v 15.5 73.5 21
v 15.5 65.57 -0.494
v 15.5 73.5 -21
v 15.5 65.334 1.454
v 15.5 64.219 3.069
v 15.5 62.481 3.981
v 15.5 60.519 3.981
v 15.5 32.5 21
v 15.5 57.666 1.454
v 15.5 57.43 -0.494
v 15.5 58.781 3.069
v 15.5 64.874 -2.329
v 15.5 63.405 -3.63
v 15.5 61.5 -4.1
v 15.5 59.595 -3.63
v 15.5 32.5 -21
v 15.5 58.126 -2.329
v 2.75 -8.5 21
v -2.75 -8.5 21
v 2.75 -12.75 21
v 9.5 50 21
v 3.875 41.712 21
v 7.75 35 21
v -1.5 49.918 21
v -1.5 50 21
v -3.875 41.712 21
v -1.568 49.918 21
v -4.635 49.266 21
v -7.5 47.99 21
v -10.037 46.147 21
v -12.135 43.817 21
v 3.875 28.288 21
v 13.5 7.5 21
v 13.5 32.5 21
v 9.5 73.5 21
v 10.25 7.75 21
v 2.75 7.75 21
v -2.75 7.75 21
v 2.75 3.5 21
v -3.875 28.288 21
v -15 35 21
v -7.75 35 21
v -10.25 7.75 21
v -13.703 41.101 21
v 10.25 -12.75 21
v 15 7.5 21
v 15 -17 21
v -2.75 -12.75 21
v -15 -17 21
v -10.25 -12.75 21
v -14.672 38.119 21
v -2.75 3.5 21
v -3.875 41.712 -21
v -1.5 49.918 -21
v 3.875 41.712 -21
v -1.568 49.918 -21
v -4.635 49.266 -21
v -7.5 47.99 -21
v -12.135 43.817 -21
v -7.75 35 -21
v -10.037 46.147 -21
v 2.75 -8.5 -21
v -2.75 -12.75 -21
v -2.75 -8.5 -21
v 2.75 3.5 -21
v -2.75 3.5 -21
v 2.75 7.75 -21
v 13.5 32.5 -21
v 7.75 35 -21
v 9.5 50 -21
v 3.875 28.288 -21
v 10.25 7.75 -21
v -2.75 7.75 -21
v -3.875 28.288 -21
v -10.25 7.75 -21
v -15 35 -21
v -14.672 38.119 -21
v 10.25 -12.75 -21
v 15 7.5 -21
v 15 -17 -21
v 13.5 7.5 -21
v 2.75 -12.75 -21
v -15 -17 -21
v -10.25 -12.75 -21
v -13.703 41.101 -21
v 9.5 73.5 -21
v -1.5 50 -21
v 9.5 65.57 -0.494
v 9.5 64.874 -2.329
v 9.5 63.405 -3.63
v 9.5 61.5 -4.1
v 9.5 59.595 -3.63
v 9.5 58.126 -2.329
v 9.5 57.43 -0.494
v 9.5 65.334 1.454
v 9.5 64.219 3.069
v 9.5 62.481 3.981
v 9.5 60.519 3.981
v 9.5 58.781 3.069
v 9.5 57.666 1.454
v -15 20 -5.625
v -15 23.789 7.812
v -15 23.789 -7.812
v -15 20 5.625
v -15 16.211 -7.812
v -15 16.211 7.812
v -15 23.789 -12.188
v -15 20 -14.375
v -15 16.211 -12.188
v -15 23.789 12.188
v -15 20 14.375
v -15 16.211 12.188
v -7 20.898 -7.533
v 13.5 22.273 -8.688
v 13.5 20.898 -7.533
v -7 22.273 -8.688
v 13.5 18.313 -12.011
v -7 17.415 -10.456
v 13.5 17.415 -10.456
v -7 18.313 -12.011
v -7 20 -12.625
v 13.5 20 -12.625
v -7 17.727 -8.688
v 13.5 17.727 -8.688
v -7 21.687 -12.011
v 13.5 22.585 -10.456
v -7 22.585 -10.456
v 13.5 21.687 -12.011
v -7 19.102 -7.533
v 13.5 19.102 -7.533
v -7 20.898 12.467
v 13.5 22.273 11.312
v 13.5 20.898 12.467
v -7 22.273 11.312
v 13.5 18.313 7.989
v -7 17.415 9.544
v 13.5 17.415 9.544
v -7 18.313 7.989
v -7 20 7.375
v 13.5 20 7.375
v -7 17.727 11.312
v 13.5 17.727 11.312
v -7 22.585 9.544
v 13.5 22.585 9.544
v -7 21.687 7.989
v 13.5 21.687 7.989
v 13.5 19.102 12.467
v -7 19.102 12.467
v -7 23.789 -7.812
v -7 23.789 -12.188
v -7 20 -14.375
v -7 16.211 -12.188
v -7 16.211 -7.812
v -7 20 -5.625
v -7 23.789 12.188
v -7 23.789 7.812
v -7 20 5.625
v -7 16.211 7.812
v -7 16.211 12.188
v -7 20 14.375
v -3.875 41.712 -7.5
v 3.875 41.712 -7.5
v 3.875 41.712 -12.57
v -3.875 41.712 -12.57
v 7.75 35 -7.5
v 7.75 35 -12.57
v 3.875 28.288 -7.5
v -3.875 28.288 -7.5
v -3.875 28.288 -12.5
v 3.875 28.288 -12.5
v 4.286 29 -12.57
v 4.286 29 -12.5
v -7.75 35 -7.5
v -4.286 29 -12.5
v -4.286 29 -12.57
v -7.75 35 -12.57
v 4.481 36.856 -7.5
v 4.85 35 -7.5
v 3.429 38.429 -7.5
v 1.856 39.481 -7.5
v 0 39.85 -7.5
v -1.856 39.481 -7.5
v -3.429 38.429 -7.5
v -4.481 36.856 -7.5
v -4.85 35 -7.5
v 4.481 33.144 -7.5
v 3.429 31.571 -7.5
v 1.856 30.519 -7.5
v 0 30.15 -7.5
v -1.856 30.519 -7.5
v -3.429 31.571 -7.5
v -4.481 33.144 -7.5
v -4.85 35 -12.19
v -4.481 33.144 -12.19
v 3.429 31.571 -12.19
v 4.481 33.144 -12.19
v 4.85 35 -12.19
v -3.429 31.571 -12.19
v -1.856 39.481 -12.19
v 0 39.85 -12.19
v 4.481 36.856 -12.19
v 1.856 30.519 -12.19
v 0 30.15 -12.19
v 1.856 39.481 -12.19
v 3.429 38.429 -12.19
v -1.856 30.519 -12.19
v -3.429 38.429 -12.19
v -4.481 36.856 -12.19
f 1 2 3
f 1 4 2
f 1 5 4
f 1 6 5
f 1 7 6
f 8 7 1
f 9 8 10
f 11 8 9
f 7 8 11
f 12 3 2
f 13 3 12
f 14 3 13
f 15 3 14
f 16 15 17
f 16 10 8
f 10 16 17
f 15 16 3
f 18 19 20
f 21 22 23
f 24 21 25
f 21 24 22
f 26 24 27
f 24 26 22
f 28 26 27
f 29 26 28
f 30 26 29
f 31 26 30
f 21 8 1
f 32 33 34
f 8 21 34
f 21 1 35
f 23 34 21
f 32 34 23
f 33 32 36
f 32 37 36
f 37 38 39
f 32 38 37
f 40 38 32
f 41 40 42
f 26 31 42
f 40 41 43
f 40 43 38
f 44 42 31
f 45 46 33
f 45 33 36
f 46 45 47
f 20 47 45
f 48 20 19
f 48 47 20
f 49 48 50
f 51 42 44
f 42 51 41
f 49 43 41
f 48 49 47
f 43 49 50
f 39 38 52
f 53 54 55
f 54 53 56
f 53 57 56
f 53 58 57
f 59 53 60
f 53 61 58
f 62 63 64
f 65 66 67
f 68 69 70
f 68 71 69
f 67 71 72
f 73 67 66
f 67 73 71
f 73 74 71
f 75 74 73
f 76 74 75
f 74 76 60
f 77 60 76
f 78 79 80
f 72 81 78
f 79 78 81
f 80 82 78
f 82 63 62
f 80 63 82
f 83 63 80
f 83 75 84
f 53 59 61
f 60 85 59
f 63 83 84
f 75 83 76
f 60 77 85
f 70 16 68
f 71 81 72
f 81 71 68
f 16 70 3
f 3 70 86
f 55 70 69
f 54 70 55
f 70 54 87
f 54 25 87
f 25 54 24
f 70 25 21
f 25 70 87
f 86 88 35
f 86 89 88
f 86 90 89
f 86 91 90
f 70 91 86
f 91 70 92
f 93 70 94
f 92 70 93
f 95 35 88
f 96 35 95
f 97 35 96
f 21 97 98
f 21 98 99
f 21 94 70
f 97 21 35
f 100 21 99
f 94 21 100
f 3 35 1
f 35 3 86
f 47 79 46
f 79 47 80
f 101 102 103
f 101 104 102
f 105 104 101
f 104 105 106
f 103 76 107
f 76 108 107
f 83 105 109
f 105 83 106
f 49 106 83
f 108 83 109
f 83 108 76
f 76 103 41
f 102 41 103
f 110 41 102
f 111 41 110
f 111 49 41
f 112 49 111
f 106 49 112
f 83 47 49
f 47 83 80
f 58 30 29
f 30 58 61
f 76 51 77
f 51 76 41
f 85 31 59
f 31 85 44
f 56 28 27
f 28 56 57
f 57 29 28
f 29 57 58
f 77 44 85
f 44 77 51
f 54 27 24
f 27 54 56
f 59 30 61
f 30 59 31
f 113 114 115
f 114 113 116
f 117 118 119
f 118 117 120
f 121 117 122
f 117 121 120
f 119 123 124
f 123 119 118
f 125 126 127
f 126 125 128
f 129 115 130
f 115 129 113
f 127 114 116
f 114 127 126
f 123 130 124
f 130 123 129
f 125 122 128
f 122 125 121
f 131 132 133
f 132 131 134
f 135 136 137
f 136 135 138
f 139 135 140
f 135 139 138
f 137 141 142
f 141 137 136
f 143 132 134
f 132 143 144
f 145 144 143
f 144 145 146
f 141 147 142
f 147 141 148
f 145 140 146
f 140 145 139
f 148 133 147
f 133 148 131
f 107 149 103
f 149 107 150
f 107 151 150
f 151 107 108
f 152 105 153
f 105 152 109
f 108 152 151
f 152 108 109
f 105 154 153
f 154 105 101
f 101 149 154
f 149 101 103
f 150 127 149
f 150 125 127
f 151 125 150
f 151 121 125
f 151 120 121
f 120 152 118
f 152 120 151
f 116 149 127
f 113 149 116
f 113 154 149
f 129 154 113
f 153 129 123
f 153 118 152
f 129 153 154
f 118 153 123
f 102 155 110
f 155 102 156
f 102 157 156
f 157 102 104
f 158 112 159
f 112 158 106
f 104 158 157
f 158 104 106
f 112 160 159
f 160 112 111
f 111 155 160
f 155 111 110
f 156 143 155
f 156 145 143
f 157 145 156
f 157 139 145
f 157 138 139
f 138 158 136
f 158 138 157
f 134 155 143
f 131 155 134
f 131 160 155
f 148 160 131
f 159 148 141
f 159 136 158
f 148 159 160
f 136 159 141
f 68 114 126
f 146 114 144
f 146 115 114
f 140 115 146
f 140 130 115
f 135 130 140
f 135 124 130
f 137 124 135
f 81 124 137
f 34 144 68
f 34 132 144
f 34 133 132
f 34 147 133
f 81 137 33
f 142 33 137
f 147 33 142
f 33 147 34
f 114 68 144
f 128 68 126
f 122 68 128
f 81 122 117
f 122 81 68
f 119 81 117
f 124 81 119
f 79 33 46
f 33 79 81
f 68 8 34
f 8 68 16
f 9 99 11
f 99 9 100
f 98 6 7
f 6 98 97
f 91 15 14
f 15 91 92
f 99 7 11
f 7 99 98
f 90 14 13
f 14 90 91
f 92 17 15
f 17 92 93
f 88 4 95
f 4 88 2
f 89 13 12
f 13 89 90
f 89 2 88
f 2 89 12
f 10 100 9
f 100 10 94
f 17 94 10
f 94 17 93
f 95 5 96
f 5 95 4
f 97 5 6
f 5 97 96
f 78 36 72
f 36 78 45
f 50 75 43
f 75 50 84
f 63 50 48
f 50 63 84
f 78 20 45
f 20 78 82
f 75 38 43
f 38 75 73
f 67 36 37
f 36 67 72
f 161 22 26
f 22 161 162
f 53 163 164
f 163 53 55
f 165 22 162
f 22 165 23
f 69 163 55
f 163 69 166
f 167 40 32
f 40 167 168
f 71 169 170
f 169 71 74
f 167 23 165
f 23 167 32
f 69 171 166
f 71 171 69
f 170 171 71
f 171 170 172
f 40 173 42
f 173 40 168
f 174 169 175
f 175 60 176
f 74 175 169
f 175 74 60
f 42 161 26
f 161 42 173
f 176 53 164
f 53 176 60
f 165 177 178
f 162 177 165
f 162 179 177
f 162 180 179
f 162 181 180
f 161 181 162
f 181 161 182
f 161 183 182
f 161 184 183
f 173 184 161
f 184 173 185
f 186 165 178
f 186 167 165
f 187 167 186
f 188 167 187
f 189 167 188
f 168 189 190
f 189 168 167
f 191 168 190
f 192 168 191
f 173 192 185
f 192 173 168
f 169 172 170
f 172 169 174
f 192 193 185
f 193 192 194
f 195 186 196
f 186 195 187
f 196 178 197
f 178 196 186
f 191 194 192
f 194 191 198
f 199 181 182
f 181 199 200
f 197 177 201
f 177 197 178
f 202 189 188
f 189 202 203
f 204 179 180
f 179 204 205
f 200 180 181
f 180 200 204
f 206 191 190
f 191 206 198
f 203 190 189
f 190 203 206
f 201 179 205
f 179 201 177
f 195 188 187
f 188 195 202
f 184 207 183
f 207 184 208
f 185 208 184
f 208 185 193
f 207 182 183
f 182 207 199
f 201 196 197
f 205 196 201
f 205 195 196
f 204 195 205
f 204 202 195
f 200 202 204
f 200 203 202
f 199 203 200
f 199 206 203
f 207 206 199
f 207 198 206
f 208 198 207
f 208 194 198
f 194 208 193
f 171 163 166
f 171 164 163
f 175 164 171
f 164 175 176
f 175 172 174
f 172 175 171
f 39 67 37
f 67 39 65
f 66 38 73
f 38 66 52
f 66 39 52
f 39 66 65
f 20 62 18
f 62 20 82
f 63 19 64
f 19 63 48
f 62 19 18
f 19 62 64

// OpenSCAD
// file: Rook_Config.scad
// Rook 3D Printer Configuration
// Created By Jeffrey Olijar 
// Jolijar@gmail.com

// Layer Height
LH = 0.38;

// 608 skate bearing
Bearing_OD = 23; 
Bearing_ID = 8;
Bearing_H = 7;

// M3 Nut Diameter
N3 = 7.5;

// M3 Screw Hole Diameter
M3 = 4.25;

// M4 Screw Hole Diameter
M4 = 5.25;
N4 = 8.75;

// M5 Screw Hole Diameter
M5 = 6;

// M8 Rod Diameter (configure for a tight fit)
M8 = 8.2;

// M8 Nut Diameter
N8 = 15.5;

//LM8UU Bearing
LBD = 15.4; // Diameter
LBH = 25; // Height
LBI = 8;  // Inner Diameter

//Makergear Groovemount
GVO = 16.5; // Outside Diameter
GVI = 12.5;  // Inside Groove Diameter

// Distance Between Centers for X rods
DBCX = 70;
// main file
// Rook 3D Printer 
// X Idler
// Created By Jeffrey Olijar 
// Jolijar@gmail.com
// Revision 1.00
// 1 x requred 


include <Rook_Config.scad>

module Rook_X_Idler(){

mirror([ 0, 1, 0 ]){


// Slider Part 
translate(v=[0,-6,0]){ cube(size = [5.5,5,42], center = true);}
translate(v=[0,11,0]){ cube(size = [5.5,5,42], center = true);}
translate(v=[2.5,2.5,0])rotate(a=[0,0,90]){ 
//translate(v=[0,-6,0]){ cube(size = [5.5,5,42], center = true);}
//translate(v=[0,11,0]){ cube(size = [5.5,5,42], center = true);}
}
difference(){ 
union(){
translate(v=[7,-40,0]){ 
cube(size = [17,20,42], center = true);
}
translate(v=[12.5,-61.5,0]){ 
cube(size = [6,24,42], center = true);
}




// Misumi Rail Box
translate(v=[0,2,0]){ cube(size = [30,30,42], center = true);}


translate(v=[0,-23.5,0]){ cube(size = [30,23,42], center = true);}
translate(v=[0,-35,-21]){cylinder(h = 42, r=15);}

}

union(){


rotate(a=[0,90,0])translate(v=[0,-61.5,0]){ 
cylinder(h=43,r=M8/2, center = true);


}
rotate(a=[0,90,0])translate(v=[0,40,0]){ 
translate(v=[10,-60,-20]){ cylinder(h=50,r=M4/2);}
translate(v=[-10,-60,-20]){cylinder(h=50,r=M4/2);}
translate(v=[10,-60,-32]){cylinder(h=50,r=N4/2,$fn=6, center = true);}
translate(v=[-10,-60,-32]){cylinder(h=50,r=N4/2,$fn=6, center = true);}
translate(v=[0,-60,16]){cube(size = [43,25,5], center = true);}
}
// Misumi Rail Cutout
translate(v=[0,2.5,0]){ cube(size = [20.5,20.5,43], center = true);}
//translate(v=[-20,3,0])rotate(a=[0,90,0]){cylinder(h=100,r=M5/2);}

//translate(v=[0,-35,-25]){cylinder(h = 100, r=Bearing_ID);}
translate(v=[0,-35,0]){cylinder(h=43,r=N8/2,$fn=6, center = true);}

}}




translate(v=[0,-25,0]){ 

translate(v=[0,-12,-12-LH]){ 
cube(size = [20,16,LH], center = true);
}

difference(){ 
union(){

translate(v=[0,-11,-10]){ 
cube(size = [20,16,5], center = true);
}
}
union(){
translate(v=[0,-10,0]){ 
cylinder(h=50,r=M8/2+0.75, center = true);
}
}
}
}

}
}
Rook_X_Idler();
